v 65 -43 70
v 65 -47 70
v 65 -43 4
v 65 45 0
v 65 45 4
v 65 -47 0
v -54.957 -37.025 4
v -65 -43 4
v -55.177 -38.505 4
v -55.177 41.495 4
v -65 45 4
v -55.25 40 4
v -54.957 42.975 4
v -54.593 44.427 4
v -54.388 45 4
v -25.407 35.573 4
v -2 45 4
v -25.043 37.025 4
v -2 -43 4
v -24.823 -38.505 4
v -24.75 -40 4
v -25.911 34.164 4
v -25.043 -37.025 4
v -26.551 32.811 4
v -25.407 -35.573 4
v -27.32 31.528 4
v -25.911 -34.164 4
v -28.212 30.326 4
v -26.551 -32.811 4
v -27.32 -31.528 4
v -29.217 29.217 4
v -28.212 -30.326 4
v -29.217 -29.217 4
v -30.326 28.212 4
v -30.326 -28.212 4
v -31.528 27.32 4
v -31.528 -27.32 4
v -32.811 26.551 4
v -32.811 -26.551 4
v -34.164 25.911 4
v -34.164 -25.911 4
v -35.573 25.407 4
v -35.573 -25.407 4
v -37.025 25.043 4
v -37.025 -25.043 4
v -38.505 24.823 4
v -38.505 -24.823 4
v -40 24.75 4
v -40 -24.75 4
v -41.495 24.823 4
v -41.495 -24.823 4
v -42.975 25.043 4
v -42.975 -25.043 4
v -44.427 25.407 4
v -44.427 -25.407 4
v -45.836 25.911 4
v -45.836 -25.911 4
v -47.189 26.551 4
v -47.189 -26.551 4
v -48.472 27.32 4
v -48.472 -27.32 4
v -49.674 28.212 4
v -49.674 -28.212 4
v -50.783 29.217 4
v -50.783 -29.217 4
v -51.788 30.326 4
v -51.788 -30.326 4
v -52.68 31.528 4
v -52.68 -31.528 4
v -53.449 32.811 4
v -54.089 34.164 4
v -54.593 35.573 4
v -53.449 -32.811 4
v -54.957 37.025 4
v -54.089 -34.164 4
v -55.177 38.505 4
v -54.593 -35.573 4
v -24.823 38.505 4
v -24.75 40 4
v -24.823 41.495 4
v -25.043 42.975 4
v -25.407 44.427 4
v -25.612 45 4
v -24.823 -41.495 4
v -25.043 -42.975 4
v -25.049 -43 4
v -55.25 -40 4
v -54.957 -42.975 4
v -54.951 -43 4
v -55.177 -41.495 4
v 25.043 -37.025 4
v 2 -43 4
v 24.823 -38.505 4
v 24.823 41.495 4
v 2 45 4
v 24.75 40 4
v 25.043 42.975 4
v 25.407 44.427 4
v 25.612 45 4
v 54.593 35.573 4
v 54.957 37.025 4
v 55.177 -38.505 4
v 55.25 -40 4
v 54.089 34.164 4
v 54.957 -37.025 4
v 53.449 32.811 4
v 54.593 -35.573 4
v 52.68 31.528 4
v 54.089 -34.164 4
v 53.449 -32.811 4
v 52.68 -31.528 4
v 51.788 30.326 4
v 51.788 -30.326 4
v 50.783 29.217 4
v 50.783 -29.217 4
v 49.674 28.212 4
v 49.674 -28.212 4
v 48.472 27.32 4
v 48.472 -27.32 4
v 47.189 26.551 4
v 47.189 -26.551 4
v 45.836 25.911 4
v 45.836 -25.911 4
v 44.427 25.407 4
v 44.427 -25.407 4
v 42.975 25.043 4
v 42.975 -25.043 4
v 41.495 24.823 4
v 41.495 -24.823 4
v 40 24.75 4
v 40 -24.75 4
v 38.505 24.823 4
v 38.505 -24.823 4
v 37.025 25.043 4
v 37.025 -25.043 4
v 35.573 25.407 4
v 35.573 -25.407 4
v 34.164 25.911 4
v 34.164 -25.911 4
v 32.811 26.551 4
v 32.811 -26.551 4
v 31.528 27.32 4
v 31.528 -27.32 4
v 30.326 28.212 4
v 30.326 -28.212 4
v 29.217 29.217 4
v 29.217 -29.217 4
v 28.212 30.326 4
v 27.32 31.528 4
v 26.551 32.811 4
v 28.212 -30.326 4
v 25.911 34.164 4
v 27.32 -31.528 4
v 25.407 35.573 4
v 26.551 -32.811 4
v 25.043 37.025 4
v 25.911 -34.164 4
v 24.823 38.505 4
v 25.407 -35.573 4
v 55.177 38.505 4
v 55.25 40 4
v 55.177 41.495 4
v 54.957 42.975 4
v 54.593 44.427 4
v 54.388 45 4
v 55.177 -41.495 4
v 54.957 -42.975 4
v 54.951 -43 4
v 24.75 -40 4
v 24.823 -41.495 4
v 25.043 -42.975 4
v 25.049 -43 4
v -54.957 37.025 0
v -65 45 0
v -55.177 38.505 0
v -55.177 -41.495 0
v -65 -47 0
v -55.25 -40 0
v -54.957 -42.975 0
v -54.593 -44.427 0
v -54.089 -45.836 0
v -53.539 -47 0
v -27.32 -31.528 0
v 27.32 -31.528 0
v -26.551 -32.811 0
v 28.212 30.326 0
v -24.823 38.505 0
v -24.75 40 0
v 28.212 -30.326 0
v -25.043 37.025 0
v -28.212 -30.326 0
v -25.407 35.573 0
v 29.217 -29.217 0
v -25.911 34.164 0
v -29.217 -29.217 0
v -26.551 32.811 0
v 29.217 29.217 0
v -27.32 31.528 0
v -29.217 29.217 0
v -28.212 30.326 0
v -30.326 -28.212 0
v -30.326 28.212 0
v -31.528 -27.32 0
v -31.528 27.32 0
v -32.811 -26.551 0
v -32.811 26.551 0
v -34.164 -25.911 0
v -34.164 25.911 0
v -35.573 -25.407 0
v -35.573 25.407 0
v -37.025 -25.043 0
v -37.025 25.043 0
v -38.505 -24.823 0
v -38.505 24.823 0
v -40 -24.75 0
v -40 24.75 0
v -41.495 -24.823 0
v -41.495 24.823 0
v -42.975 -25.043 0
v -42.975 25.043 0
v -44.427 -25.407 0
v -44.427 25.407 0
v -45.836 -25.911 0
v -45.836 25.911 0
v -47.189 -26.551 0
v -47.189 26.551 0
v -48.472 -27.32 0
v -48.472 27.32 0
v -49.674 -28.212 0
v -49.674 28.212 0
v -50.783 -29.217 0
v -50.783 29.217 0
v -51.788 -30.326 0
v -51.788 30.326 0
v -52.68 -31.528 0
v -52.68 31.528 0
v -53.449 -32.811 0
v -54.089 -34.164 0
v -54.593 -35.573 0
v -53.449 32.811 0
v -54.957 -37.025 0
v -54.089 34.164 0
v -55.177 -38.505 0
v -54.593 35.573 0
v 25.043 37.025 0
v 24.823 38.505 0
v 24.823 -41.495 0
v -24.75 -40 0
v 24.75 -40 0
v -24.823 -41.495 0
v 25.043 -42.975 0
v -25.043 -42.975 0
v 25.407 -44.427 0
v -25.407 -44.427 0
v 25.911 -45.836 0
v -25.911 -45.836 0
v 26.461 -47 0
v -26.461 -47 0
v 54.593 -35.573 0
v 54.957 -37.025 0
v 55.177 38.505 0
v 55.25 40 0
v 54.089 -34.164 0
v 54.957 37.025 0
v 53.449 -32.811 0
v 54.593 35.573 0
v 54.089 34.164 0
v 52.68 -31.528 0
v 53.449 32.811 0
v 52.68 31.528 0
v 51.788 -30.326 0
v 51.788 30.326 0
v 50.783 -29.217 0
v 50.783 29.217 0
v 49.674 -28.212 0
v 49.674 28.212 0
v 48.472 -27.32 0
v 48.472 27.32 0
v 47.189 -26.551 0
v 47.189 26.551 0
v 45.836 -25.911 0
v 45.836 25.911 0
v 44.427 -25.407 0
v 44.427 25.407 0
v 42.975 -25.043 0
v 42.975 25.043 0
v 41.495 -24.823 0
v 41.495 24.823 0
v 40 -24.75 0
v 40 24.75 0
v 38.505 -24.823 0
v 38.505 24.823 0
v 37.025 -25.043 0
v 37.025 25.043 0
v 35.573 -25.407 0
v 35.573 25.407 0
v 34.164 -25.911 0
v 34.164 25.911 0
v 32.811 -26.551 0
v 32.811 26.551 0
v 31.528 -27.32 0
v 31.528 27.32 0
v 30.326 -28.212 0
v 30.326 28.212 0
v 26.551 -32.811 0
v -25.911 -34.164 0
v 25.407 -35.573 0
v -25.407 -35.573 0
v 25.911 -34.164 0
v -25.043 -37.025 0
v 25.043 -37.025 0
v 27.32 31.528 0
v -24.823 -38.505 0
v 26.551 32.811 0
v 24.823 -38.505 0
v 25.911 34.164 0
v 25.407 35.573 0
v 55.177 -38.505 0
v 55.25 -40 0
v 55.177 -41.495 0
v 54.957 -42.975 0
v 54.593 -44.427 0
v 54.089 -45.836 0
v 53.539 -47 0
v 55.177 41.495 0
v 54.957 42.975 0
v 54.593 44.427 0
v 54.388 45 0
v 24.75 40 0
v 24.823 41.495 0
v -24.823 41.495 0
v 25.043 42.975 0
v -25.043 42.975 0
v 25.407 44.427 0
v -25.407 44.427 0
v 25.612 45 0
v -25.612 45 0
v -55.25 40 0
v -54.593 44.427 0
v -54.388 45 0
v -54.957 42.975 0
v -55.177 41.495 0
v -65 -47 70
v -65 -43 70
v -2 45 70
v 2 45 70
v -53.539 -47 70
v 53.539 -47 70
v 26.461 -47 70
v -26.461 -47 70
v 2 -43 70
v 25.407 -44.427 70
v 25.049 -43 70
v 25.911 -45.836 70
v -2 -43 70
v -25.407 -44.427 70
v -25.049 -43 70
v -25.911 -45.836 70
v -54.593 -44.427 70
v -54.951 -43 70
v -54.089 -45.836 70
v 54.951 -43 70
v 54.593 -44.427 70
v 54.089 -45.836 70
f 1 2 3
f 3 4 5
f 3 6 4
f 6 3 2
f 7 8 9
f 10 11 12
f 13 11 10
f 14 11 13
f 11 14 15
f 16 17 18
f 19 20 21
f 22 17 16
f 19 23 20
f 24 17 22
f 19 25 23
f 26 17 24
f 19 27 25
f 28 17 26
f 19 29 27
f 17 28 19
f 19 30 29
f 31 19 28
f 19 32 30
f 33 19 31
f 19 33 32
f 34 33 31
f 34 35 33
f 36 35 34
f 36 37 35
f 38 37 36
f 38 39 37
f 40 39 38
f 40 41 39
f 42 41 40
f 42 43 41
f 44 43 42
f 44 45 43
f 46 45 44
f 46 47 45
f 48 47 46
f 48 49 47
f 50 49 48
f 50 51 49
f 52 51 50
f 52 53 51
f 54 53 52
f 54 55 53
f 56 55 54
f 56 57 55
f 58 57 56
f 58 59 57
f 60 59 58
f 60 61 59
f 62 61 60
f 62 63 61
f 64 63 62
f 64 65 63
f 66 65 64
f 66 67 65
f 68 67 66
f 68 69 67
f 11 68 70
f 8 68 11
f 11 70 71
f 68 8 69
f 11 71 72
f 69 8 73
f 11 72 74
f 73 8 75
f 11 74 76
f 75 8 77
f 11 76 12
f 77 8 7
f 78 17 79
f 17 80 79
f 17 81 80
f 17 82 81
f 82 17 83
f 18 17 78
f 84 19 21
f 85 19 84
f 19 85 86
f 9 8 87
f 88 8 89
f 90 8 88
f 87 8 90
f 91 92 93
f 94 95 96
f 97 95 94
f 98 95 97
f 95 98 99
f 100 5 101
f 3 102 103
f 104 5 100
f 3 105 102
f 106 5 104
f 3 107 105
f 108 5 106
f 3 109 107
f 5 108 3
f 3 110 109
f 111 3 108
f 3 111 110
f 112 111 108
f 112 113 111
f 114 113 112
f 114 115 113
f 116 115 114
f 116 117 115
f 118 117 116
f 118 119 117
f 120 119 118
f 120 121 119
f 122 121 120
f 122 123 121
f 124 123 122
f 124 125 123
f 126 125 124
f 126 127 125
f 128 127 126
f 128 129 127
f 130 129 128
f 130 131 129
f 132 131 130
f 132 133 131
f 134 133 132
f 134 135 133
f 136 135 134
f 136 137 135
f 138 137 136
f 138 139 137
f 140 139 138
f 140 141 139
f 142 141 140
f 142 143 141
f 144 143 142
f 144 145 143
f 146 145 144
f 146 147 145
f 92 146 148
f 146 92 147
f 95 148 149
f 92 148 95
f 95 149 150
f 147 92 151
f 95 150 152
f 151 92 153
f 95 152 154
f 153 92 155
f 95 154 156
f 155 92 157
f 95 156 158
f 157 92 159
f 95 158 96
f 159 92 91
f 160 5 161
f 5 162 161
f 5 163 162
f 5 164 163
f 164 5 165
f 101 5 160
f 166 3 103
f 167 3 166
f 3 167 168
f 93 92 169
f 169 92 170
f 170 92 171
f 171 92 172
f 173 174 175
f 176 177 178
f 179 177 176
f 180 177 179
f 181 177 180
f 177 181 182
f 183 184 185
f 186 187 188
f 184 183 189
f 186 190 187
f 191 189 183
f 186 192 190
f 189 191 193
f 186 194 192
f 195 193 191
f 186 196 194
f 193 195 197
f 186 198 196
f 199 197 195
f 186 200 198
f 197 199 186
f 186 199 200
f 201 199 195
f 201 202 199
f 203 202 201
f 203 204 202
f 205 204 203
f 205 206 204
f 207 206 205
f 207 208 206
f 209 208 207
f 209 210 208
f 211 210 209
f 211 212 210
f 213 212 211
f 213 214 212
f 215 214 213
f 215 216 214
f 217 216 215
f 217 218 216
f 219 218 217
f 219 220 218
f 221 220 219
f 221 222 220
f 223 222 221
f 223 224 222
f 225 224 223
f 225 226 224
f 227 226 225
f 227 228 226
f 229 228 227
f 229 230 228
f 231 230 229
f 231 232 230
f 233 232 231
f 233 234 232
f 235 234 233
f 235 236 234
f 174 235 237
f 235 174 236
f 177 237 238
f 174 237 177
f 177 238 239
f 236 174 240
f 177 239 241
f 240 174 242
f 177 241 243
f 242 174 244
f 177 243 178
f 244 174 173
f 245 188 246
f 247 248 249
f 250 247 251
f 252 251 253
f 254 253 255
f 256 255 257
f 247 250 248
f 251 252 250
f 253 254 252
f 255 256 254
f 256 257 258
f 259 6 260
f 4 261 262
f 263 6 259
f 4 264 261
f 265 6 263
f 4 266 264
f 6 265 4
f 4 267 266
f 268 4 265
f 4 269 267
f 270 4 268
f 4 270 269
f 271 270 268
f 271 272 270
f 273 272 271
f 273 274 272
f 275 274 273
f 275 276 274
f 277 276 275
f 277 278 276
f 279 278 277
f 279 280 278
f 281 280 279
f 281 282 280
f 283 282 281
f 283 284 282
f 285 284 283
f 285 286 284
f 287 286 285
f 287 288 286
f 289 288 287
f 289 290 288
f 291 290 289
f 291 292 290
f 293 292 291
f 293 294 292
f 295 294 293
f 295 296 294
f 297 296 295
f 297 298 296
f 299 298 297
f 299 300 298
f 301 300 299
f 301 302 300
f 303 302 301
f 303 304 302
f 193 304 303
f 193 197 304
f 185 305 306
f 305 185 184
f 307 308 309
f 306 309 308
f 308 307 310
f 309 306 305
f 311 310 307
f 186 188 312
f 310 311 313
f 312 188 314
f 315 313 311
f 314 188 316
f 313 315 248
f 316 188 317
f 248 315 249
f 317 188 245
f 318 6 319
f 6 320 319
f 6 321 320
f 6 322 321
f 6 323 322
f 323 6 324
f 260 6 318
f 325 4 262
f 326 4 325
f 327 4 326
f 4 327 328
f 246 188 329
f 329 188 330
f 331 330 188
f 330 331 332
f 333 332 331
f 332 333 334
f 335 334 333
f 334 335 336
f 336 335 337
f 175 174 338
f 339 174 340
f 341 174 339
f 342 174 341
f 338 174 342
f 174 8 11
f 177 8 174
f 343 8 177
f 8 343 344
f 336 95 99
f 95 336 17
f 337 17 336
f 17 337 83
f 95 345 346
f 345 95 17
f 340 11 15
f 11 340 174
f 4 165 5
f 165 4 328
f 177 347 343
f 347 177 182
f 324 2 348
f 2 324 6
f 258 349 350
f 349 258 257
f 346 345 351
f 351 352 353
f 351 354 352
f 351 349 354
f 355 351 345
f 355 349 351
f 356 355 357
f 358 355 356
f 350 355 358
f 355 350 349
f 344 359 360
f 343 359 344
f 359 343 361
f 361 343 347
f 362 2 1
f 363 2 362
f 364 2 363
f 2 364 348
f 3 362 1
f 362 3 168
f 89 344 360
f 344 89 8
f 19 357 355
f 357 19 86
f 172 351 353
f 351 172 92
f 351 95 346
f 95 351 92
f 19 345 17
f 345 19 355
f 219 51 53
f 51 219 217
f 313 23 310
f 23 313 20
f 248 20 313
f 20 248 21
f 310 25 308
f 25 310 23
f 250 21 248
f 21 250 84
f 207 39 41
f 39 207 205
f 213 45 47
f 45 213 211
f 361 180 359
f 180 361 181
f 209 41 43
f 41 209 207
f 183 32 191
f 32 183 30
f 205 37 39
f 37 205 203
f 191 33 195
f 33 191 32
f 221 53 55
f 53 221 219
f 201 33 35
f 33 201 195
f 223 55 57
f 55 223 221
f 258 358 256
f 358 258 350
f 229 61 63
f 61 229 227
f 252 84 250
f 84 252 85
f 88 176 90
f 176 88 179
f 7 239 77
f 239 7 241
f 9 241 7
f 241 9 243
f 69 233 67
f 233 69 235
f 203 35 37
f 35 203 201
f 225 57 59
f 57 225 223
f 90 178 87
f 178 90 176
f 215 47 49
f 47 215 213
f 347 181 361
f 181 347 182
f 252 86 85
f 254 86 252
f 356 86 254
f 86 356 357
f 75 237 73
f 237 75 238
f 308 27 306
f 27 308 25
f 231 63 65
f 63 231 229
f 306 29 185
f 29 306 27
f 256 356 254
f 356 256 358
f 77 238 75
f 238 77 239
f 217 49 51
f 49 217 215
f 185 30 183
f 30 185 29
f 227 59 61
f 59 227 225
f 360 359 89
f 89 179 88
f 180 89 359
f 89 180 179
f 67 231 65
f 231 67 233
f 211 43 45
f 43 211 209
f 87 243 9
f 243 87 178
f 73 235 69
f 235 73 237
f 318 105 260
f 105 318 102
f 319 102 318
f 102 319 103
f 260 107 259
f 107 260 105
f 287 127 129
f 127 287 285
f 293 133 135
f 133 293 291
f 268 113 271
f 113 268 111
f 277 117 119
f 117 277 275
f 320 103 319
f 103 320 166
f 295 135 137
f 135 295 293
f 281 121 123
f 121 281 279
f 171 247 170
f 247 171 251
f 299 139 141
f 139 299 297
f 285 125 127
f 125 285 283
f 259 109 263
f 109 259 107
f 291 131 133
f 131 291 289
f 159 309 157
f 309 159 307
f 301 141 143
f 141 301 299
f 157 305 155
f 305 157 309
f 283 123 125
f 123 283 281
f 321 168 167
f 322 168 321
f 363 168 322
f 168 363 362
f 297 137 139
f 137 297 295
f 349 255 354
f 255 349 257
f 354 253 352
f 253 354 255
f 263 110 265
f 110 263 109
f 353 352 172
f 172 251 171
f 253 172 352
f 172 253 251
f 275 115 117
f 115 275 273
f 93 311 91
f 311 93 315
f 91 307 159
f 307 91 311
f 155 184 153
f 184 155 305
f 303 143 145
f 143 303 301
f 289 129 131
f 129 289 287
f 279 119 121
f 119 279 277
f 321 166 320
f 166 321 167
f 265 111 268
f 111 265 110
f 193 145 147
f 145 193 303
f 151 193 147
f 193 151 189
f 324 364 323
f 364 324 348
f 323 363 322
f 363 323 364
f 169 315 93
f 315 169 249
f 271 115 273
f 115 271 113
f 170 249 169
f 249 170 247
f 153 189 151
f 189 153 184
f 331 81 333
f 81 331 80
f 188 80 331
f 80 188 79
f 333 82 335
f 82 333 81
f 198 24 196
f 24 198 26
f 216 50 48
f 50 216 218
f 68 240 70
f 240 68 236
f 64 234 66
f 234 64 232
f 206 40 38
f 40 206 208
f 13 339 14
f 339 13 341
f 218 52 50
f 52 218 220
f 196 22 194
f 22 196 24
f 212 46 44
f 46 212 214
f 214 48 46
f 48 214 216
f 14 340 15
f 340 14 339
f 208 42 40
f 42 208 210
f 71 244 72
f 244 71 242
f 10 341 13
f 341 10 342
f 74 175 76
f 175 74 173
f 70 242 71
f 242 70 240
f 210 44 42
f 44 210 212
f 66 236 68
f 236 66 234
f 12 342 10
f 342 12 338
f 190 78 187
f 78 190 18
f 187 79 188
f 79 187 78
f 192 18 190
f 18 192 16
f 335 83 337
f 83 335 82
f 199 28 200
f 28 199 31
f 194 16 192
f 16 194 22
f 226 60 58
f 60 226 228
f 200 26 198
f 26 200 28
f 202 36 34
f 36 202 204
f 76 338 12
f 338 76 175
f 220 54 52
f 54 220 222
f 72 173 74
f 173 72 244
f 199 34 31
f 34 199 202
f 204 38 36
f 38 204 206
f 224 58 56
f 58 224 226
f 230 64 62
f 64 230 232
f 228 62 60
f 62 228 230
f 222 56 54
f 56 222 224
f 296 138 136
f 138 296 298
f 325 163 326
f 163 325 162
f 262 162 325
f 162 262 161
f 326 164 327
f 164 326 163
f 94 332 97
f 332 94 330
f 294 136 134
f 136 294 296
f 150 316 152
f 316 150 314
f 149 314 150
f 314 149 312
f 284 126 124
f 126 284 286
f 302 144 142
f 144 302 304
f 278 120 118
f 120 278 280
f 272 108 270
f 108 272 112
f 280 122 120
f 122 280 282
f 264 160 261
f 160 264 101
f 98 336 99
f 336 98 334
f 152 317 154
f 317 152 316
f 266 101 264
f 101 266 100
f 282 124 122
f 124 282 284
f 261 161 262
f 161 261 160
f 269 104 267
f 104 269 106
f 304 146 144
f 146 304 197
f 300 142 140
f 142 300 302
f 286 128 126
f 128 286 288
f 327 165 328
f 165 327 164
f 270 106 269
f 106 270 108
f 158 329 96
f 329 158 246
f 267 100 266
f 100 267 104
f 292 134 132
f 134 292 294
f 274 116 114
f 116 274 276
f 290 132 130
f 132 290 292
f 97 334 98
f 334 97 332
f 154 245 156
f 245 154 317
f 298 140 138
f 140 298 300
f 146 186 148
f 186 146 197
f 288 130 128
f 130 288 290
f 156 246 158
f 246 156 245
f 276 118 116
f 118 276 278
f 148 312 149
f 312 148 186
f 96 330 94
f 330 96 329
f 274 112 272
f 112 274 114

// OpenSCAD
// Built by bench/smallmodels/features/compiler.py from a list of features.
$fn = 64;
difference() {
  union() {
    translate([0, 0, 0]) translate([-65, -45, 0]) cube([130, 90, 4]);
    translate([0, -45, 0]) linear_extrude(height = 70) polygon([[-65, -2], [-65, 2], [65, 2], [65, -2]]);
    translate([0, 0, 0]) linear_extrude(height = 70) polygon([[-2, -45], [2, -45], [2, 45], [-2, 45]]);
  }
  union() {
    translate([-40, -40, -1]) rotate([0, 0, 0]) cylinder(d = 30.5, h = 72);
    translate([40, -40, -1]) rotate([0, 0, 0]) cylinder(d = 30.5, h = 72);
    translate([-40, 40, -1]) rotate([0, 0, 0]) cylinder(d = 30.5, h = 72);
    translate([40, 40, -1]) rotate([0, 0, 0]) cylinder(d = 30.5, h = 72);
  }
}
